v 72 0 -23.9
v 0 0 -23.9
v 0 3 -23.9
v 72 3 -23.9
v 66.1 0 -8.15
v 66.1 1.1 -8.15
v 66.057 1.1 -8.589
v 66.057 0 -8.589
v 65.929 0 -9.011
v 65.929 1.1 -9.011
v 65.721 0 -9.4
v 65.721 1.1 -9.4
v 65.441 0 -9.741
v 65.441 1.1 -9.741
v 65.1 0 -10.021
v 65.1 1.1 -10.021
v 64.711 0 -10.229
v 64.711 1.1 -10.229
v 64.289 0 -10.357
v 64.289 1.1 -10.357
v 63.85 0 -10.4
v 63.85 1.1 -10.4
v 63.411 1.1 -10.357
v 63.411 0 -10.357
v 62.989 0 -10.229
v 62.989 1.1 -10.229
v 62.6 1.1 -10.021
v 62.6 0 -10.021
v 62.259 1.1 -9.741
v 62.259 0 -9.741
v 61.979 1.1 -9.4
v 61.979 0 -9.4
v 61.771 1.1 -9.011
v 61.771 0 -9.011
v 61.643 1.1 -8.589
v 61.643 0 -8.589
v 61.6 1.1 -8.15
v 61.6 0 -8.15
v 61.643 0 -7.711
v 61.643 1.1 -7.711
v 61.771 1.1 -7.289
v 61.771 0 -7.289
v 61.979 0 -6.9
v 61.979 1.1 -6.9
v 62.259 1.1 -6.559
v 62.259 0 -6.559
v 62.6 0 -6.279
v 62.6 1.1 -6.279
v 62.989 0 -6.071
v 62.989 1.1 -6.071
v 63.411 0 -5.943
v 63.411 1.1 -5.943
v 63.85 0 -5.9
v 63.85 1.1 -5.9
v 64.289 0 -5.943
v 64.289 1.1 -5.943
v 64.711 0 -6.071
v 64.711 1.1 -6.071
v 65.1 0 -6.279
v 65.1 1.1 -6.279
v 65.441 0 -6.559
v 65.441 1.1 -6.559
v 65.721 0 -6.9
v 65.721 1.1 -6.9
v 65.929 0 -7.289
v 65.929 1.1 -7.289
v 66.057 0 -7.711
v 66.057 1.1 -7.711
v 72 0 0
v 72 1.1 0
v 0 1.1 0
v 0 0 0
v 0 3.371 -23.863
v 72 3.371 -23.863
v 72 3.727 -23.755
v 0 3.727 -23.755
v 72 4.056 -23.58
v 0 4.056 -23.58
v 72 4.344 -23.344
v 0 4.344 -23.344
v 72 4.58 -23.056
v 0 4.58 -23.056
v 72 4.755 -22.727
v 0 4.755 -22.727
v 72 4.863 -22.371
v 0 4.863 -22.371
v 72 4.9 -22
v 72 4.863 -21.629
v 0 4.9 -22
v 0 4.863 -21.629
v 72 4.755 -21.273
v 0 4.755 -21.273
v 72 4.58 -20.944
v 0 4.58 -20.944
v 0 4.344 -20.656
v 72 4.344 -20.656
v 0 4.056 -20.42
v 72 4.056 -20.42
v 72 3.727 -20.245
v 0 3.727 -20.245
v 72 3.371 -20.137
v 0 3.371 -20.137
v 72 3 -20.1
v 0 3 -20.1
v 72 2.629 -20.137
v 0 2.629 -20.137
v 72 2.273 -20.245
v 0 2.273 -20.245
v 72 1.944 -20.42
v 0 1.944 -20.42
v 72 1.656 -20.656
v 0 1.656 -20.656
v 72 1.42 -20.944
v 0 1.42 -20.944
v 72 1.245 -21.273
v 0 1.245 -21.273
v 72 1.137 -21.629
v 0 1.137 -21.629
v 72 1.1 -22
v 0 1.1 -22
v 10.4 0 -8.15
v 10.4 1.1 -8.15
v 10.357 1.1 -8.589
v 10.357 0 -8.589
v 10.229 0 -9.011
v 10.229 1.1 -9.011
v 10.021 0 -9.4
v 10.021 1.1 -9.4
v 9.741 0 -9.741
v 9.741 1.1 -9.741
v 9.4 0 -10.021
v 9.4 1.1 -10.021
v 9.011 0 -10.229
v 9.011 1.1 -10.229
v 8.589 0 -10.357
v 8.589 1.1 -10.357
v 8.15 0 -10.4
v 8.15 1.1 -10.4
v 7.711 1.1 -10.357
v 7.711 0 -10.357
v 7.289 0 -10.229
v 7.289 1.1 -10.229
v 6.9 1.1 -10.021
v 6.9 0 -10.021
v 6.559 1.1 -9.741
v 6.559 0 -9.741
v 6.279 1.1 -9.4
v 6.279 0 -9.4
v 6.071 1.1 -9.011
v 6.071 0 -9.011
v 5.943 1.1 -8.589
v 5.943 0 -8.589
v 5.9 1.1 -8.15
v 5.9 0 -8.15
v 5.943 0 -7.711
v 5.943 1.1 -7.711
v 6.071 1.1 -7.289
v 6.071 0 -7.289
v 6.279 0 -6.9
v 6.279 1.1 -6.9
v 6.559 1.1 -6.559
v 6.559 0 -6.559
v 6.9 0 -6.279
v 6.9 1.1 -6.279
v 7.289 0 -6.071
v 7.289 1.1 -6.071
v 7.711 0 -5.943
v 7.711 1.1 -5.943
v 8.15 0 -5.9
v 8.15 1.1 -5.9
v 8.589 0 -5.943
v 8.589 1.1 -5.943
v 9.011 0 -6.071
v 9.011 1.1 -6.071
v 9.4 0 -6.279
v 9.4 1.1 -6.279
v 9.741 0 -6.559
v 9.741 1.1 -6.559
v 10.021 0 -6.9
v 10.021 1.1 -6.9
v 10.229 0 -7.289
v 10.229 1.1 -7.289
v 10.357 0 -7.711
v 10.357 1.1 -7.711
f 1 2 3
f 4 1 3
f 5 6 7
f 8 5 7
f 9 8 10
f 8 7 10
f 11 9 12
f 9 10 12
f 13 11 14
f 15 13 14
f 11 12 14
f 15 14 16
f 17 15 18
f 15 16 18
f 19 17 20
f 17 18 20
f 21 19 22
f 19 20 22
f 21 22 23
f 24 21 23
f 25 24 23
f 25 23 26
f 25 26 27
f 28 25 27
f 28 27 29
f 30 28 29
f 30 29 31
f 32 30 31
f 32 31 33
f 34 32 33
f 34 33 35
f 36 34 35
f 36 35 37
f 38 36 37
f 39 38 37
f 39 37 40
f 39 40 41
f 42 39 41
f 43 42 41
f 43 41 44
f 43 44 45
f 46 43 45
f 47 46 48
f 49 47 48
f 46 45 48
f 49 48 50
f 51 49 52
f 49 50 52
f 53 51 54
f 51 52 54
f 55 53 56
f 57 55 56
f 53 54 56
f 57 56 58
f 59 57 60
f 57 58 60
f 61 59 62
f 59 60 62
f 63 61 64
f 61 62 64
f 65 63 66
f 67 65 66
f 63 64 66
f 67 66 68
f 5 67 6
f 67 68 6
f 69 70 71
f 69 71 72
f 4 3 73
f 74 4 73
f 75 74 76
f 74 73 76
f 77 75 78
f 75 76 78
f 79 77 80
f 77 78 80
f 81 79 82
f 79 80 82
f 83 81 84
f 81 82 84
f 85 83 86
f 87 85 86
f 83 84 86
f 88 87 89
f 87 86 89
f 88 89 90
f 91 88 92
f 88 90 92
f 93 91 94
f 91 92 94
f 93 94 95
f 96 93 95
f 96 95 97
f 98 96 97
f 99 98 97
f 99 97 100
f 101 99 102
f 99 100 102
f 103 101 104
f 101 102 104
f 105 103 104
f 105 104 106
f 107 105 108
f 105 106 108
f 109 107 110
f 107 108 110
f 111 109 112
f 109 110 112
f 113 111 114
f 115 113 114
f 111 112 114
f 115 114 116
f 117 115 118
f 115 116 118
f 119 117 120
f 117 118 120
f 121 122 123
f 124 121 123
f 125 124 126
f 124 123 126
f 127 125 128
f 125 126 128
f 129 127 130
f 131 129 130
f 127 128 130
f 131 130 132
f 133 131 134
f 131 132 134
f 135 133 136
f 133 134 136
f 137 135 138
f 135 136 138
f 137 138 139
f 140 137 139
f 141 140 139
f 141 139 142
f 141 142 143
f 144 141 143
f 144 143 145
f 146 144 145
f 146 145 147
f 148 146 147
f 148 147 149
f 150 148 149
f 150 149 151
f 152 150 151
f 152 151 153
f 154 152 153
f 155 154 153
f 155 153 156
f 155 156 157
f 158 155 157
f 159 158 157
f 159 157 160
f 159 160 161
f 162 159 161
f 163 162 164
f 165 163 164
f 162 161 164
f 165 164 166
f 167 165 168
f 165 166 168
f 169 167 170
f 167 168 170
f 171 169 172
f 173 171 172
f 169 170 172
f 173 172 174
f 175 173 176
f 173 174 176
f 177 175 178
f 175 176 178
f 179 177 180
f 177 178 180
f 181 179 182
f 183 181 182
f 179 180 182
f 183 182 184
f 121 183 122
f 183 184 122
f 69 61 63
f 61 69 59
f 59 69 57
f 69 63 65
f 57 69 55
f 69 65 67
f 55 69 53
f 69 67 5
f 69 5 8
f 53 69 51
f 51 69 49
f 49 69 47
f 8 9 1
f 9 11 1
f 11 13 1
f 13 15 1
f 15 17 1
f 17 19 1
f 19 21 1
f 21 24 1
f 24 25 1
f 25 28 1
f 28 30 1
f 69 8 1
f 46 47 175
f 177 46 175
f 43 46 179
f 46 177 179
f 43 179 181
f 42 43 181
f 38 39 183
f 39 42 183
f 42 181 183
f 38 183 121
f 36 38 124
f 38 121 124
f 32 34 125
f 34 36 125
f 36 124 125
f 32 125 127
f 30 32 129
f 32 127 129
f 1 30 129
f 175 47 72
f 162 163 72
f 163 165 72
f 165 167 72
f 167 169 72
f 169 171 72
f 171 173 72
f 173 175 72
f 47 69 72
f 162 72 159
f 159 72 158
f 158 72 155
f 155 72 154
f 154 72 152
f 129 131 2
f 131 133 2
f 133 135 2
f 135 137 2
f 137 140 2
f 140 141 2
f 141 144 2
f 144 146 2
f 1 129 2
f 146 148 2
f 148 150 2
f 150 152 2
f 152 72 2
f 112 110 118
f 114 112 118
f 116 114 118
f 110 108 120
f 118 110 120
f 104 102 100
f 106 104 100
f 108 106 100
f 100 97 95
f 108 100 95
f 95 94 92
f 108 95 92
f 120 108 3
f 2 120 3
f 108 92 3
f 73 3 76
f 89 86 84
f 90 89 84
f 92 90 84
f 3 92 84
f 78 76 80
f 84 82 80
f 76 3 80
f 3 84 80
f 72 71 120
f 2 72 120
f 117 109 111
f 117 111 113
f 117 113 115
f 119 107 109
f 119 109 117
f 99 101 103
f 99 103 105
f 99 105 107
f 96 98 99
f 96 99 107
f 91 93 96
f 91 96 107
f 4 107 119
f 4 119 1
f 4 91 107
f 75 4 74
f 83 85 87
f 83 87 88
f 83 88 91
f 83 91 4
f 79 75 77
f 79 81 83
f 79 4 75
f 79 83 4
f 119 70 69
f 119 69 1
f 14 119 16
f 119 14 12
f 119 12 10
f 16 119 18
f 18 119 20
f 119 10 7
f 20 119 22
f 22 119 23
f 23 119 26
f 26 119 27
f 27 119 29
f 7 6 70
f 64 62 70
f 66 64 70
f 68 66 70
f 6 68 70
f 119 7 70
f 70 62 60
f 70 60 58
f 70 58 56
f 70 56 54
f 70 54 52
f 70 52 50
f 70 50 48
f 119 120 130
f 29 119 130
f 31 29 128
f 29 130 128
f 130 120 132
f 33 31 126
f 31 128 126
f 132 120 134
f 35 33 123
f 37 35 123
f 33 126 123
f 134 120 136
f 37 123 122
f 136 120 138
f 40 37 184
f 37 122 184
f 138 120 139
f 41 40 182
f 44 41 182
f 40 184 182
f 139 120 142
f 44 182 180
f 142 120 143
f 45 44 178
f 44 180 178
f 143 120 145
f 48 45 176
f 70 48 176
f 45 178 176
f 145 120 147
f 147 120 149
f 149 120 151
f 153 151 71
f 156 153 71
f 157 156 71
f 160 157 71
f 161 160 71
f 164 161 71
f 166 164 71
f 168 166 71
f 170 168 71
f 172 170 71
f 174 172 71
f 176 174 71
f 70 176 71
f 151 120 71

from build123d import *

# Parameters (mm, degrees)
SKETCH_1_R          = 1.9
EXTRUDE_1_DEPTH     = 72
SKETCH_2_R          = 2.25
CUT_EXTRUDE_1_DEPTH = 2.1


with BuildPart() as part:
    # 草图1 → 凸台-拉伸1 (new body)
    with BuildSketch(Plane(origin=(0, 0, 0), x_dir=(0, 0, -1), z_dir=(1, 0, 0))):
        with Locations((22, 3)):
            Circle(SKETCH_1_R)
        with BuildLine():
            Line((0, 1.1), (0, 0))
            Line((0, 0), (19, 0))
            Line((19, 0), (23.9, 0))
            Line((23.9, 0), (23.9, 3))
            ThreePointArc((23.9, 3), (23.343502884, 1.656497116), (22, 1.1))
            Line((22, 1.1), (19, 1.1))
            Line((19, 1.1), (0, 1.1))
        make_face()
    extrude(amount=EXTRUDE_1_DEPTH)

    # 草图2 → 切除-拉伸1 (cut, through all)
    with BuildSketch(Plane(origin=(0, 1.1, 0), x_dir=(1, 0, 0), z_dir=(0, 1, 0))):
        with Locations((8.15, 8.15)):
            Circle(SKETCH_2_R)
        with Locations((63.85, 8.15)):
            Circle(SKETCH_2_R)
    extrude(amount=-CUT_EXTRUDE_1_DEPTH, mode=Mode.SUBTRACT)


solid = part.part
